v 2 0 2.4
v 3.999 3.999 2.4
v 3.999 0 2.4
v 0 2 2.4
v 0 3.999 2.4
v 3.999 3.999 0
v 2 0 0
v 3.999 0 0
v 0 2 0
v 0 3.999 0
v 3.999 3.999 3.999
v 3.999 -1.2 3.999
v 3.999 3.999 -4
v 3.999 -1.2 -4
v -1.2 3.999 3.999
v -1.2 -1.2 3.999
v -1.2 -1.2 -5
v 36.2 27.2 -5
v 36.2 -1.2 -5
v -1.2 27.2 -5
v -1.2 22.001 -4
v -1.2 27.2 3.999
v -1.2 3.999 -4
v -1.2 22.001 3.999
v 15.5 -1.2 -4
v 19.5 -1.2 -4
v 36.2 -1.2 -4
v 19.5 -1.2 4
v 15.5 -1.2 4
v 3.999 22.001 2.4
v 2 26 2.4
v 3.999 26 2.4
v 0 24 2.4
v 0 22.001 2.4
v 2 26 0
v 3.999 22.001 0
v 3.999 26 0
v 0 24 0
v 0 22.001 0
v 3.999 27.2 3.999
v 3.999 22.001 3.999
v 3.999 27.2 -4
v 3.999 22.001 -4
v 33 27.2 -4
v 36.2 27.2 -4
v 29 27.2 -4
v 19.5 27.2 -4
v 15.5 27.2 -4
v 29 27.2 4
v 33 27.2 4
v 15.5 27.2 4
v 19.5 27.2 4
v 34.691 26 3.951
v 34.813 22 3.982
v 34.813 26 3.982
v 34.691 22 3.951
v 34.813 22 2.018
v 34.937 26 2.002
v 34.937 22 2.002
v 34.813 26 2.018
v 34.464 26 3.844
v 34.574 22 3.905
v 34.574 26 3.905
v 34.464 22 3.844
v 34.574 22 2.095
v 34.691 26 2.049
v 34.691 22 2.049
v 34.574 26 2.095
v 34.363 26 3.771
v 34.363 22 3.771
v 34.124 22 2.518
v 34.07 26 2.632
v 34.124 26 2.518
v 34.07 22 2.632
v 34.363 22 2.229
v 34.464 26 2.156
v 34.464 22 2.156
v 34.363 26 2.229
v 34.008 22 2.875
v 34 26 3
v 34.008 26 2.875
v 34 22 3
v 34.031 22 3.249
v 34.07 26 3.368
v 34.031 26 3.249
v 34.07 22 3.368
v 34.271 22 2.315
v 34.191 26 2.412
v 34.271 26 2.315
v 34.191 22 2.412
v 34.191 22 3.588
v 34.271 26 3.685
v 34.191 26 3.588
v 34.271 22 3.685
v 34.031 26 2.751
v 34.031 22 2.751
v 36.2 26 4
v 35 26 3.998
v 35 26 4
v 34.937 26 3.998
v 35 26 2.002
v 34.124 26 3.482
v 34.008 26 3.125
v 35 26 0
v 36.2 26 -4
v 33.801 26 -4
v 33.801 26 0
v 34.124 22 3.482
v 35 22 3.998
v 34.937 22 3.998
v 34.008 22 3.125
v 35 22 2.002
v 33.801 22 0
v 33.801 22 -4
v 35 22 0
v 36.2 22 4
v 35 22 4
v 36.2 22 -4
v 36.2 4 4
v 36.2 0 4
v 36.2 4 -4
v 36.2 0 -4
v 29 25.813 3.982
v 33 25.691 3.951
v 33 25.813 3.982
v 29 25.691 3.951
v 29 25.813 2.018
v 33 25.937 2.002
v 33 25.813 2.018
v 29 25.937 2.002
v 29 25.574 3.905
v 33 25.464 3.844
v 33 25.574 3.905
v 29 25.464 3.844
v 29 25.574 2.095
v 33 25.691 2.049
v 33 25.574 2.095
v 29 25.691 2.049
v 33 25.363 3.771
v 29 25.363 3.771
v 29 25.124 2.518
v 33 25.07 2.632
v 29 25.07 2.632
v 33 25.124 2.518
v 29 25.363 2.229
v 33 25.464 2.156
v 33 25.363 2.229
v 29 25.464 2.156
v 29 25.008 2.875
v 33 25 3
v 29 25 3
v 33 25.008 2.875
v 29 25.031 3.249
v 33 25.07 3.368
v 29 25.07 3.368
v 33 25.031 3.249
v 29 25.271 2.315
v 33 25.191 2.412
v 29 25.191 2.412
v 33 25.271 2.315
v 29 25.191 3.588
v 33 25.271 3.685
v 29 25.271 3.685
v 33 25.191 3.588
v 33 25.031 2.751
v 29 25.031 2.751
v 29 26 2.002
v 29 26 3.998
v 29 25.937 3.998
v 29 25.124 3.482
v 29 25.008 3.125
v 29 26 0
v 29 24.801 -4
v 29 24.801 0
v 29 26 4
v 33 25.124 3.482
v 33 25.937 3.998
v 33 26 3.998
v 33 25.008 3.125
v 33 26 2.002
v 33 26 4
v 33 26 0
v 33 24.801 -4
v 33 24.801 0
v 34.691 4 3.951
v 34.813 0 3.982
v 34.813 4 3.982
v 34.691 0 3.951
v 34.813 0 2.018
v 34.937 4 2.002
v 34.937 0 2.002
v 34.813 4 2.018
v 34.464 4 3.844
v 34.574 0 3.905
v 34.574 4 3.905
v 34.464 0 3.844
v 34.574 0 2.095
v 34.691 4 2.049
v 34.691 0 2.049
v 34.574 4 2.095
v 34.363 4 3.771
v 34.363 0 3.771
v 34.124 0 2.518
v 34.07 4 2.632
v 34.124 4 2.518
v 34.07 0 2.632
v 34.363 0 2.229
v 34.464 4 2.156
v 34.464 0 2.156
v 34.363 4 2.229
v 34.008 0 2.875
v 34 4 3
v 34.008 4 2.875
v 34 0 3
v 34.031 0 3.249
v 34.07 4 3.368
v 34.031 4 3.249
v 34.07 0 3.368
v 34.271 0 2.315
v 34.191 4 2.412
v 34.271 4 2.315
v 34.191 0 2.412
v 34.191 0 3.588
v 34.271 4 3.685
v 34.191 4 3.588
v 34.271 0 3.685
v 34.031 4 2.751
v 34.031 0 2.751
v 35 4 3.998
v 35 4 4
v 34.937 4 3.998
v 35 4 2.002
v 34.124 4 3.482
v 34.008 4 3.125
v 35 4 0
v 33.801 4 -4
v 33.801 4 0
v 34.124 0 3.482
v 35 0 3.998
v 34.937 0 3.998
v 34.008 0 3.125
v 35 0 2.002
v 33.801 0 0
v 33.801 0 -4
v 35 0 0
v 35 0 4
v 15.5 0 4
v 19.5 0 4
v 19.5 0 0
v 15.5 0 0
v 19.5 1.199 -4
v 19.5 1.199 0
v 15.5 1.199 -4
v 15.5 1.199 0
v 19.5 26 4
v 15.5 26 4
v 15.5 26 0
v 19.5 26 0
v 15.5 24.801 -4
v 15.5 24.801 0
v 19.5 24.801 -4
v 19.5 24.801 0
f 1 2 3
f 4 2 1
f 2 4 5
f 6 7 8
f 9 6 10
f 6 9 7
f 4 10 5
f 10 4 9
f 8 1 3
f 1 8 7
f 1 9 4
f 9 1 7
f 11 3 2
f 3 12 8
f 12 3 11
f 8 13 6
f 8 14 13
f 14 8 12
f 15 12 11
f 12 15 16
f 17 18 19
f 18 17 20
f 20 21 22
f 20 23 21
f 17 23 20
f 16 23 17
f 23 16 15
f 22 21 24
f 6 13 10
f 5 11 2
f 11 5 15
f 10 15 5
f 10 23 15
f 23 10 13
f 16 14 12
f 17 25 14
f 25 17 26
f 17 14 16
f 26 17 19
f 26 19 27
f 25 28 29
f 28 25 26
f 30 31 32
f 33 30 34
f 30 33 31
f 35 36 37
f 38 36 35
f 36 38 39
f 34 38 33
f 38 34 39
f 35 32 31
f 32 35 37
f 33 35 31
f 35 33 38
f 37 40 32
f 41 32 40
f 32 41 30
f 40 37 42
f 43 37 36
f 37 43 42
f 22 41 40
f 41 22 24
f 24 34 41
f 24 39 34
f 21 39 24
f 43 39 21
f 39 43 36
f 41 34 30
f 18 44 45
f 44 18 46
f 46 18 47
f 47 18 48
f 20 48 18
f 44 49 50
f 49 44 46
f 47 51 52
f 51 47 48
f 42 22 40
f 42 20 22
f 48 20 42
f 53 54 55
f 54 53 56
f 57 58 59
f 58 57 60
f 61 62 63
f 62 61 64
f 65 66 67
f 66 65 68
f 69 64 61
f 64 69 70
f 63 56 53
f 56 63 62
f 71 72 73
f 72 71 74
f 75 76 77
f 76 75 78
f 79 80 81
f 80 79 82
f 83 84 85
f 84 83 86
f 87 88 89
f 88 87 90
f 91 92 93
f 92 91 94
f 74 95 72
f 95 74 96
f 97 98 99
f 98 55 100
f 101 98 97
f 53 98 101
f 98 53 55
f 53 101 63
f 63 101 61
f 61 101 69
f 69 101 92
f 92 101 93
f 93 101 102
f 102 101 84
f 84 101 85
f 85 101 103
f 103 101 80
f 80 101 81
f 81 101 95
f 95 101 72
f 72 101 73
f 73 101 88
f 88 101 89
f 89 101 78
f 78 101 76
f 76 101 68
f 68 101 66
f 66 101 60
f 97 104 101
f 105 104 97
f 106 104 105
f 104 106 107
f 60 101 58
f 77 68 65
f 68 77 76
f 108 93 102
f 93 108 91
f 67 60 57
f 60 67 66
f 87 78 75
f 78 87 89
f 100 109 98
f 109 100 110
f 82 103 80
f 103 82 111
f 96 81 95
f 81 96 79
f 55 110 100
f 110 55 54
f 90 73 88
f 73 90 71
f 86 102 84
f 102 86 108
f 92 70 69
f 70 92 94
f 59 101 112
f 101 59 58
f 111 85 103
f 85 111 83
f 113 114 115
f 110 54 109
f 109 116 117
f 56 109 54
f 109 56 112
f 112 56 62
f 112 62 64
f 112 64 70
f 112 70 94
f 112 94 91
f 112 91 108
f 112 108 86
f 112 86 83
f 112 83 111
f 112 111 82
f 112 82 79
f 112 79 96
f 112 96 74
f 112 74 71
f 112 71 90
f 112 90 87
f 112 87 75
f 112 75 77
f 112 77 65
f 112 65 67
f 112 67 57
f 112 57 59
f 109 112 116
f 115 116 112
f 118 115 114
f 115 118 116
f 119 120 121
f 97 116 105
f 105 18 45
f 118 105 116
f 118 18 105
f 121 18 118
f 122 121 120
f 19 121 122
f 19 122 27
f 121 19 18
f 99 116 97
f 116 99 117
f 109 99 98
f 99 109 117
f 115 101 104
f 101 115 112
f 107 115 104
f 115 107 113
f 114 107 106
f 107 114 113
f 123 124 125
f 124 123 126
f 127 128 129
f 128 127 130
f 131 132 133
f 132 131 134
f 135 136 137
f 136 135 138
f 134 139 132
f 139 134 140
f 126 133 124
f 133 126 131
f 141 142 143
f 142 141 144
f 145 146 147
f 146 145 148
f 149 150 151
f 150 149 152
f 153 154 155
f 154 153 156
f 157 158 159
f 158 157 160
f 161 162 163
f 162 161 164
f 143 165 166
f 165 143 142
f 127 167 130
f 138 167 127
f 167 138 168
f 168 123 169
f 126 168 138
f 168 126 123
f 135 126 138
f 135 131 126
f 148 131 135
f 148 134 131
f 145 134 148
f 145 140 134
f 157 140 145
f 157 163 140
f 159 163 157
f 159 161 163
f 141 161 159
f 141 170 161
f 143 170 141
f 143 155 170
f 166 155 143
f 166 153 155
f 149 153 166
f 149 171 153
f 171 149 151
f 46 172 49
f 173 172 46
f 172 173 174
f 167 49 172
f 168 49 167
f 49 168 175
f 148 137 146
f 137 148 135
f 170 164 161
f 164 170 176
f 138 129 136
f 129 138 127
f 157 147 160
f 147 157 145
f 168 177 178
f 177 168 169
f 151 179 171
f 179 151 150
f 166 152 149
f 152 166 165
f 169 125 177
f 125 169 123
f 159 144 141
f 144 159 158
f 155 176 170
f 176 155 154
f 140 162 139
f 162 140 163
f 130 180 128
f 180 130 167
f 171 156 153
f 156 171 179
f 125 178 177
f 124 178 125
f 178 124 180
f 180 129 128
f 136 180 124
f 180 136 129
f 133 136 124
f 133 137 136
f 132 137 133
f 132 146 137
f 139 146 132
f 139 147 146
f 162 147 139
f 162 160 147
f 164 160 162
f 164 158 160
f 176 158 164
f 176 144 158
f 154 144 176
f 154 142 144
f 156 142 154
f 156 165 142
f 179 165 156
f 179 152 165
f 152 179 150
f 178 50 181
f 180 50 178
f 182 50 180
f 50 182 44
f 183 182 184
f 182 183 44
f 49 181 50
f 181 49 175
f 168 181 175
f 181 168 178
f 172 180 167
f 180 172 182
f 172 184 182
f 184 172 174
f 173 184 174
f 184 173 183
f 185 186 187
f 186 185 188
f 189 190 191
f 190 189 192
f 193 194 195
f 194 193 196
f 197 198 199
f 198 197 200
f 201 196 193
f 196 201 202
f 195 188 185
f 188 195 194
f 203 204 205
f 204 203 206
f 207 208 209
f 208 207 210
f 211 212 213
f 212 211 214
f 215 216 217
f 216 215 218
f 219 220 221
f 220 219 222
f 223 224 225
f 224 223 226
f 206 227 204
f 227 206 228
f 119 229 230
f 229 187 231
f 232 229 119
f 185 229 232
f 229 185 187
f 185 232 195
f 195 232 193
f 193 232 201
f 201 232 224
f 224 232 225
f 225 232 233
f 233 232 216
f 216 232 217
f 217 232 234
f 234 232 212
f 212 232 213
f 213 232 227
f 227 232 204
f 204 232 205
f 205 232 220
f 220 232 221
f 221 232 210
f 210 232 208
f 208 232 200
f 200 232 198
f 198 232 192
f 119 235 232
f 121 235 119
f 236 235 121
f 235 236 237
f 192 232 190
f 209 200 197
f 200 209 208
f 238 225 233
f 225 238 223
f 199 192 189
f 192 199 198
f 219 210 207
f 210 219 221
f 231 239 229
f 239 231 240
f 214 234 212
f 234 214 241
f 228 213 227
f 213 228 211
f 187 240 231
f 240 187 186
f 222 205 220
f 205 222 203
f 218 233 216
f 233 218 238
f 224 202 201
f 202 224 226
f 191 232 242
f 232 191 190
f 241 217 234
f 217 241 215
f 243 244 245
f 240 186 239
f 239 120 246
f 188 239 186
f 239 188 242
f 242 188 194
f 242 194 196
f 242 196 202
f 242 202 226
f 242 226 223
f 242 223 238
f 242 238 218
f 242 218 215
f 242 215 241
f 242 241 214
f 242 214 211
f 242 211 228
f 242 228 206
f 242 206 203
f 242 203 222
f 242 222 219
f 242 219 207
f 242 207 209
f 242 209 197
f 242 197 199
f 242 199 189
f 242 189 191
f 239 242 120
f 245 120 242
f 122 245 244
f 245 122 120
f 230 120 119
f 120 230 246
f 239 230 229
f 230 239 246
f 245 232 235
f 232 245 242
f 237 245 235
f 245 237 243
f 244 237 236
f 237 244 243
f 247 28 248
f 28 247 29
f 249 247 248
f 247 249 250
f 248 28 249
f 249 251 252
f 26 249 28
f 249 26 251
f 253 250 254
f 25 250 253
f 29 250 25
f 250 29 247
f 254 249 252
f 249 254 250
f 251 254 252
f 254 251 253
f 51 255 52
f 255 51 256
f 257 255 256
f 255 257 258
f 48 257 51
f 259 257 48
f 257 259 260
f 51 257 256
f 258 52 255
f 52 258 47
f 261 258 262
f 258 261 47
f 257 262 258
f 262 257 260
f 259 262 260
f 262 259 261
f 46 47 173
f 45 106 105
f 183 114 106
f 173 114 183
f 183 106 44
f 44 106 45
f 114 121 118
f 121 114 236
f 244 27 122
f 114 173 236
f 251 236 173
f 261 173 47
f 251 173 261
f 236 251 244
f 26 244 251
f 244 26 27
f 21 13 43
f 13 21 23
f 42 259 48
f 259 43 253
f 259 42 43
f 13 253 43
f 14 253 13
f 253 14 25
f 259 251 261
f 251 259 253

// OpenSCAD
// Copyright (C) Danny Havenith 2020
// This design is licensed under the Creative Commons - Attribution license
// See https://creativecommons.org/licenses/by/4.0/
//
// usage: in your project file add:
//    use <wemos_d1_mini_clip.scad>
// Then call:
//    wemos_d1_mini_clip( some_offset);
// This will add the necessary clips to hold the pcb in place.
// offset is the height of the bottom of the pcb from the bottom of the clips, 
// or in other words: the height of the clips.
// The clips are placed to have the bottom side of one of the corners of the PCB at [0,0,0]
//
// The clips are placed "in mid air", you still need to have some ground plate
// to attach the clips to. This is demonstrated in the module demo().
// 
wemos_d1_pcb_width = 26;
wemos_d1_pcb_length = 35;
wemos_d1_pcb_thickness = 2;
wemos_d1_thin_wall = 1.2;
wemos_d1_clip = 1; // radius of the wemos_d1_clip that sticks out at the top of a pillar.
wemos_d1_tab_width = 4;


/**
* essentially a cube with one of the edges cut off.
*/
module edged_box()
{
    rib = 4;
    sag = .4;
    dims = [rib,rib,wemos_d1_pcb_thickness+sag];
    edge_off = 2;
    d = .001;
    d3 = [d,d,d];
    // somewhat convoluted, but it works
    mirror([0,1,0]) translate( [0, -rib, 0])
    difference()
    {
        cube( dims);
        translate([0,rib-edge_off,-d]) 
            rotate([0,0,45]) cube(dims + 2*d3);
    }
}

/**
* Pillar that holds the NE,NW corners of the PCB (the dull-edged corners)
*/
module frame_corner( height)
{
    wemos_d1_thin_wall = 1.2;
    wemos_d1_clip = 1;
    d3 = [.001, .001, .001];
    edge = wemos_d1_pcb_thickness + 2*wemos_d1_clip;
    pillar_dims = [4,4,height + edge] + [wemos_d1_thin_wall, wemos_d1_thin_wall, 0] - d3;

    difference()
    {
        translate([-wemos_d1_thin_wall,-wemos_d1_thin_wall,-height]) cube (pillar_dims);
        edged_box();
    }
}
/**
* A pillar that keeps the edge of the PCB in place. If doClip is true, 
* there will be a little tab at the top of the pillar to push the PCB down.
*/
module pillar( height, doClip=true)
{
    d = .001;
    edge = wemos_d1_pcb_thickness + 2*wemos_d1_clip;
    tab_dims = [wemos_d1_thin_wall, 4, height + edge];
    if (doClip)
    {
        translate([0,-wemos_d1_tab_width/2,edge - wemos_d1_clip]) rotate([90,0,0]) cylinder(h = wemos_d1_tab_width, r = wemos_d1_clip, center=true, $fn = 50);
    }
    translate([0,-wemos_d1_tab_width,-height]) cube( tab_dims);
    translate([-wemos_d1_thin_wall+d, -wemos_d1_tab_width, -height]) cube([wemos_d1_thin_wall, wemos_d1_tab_width, height]);
}

/** 
* clip to hold a wemos d1 mini
* This module can be used in enclosures. It generates clips that can
* hold a Wemos D1 Mini in place
**/
module wemos_d1_mini_clip( offset = 5)
{

    // frame corners on the NW, NE side
    frame_corner( offset);
    translate([0, wemos_d1_pcb_width, 0]) mirror([0,1,0]) frame_corner(offset);
    
    //two tabs supporting the SE side
    translate([wemos_d1_pcb_length, wemos_d1_pcb_width, 0]) pillar(offset);
    translate([wemos_d1_pcb_length-wemos_d1_tab_width - 2*wemos_d1_clip, wemos_d1_pcb_width, 0]) rotate([0,0,90]) pillar(offset);
    
    // one pillar supporting the SW side (keep the west open for the reset button)
    translate([wemos_d1_pcb_length, wemos_d1_tab_width, 0]) pillar(offset);
    
    // two extra tabs holding the sides in the E and W position
    translate([wemos_d1_pcb_length + wemos_d1_tab_width, 0, 0] * .5) rotate([0,0,-90]) pillar( offset, false);
    translate([(wemos_d1_pcb_length - wemos_d1_tab_width)/2, wemos_d1_pcb_width, 0] )rotate([0,0,90]) pillar( offset, false);
}

module wemos_d1_mini_demo()
{
    offset = 5;

    wemos_d1_mini_clip( offset);
    
    // bottom to hold it all together
    translate([-wemos_d1_thin_wall, -wemos_d1_thin_wall,-offset]) cube([ wemos_d1_pcb_length, wemos_d1_pcb_width, 1] + 2*[wemos_d1_thin_wall, wemos_d1_thin_wall,0]);
}

wemos_d1_mini_demo();
